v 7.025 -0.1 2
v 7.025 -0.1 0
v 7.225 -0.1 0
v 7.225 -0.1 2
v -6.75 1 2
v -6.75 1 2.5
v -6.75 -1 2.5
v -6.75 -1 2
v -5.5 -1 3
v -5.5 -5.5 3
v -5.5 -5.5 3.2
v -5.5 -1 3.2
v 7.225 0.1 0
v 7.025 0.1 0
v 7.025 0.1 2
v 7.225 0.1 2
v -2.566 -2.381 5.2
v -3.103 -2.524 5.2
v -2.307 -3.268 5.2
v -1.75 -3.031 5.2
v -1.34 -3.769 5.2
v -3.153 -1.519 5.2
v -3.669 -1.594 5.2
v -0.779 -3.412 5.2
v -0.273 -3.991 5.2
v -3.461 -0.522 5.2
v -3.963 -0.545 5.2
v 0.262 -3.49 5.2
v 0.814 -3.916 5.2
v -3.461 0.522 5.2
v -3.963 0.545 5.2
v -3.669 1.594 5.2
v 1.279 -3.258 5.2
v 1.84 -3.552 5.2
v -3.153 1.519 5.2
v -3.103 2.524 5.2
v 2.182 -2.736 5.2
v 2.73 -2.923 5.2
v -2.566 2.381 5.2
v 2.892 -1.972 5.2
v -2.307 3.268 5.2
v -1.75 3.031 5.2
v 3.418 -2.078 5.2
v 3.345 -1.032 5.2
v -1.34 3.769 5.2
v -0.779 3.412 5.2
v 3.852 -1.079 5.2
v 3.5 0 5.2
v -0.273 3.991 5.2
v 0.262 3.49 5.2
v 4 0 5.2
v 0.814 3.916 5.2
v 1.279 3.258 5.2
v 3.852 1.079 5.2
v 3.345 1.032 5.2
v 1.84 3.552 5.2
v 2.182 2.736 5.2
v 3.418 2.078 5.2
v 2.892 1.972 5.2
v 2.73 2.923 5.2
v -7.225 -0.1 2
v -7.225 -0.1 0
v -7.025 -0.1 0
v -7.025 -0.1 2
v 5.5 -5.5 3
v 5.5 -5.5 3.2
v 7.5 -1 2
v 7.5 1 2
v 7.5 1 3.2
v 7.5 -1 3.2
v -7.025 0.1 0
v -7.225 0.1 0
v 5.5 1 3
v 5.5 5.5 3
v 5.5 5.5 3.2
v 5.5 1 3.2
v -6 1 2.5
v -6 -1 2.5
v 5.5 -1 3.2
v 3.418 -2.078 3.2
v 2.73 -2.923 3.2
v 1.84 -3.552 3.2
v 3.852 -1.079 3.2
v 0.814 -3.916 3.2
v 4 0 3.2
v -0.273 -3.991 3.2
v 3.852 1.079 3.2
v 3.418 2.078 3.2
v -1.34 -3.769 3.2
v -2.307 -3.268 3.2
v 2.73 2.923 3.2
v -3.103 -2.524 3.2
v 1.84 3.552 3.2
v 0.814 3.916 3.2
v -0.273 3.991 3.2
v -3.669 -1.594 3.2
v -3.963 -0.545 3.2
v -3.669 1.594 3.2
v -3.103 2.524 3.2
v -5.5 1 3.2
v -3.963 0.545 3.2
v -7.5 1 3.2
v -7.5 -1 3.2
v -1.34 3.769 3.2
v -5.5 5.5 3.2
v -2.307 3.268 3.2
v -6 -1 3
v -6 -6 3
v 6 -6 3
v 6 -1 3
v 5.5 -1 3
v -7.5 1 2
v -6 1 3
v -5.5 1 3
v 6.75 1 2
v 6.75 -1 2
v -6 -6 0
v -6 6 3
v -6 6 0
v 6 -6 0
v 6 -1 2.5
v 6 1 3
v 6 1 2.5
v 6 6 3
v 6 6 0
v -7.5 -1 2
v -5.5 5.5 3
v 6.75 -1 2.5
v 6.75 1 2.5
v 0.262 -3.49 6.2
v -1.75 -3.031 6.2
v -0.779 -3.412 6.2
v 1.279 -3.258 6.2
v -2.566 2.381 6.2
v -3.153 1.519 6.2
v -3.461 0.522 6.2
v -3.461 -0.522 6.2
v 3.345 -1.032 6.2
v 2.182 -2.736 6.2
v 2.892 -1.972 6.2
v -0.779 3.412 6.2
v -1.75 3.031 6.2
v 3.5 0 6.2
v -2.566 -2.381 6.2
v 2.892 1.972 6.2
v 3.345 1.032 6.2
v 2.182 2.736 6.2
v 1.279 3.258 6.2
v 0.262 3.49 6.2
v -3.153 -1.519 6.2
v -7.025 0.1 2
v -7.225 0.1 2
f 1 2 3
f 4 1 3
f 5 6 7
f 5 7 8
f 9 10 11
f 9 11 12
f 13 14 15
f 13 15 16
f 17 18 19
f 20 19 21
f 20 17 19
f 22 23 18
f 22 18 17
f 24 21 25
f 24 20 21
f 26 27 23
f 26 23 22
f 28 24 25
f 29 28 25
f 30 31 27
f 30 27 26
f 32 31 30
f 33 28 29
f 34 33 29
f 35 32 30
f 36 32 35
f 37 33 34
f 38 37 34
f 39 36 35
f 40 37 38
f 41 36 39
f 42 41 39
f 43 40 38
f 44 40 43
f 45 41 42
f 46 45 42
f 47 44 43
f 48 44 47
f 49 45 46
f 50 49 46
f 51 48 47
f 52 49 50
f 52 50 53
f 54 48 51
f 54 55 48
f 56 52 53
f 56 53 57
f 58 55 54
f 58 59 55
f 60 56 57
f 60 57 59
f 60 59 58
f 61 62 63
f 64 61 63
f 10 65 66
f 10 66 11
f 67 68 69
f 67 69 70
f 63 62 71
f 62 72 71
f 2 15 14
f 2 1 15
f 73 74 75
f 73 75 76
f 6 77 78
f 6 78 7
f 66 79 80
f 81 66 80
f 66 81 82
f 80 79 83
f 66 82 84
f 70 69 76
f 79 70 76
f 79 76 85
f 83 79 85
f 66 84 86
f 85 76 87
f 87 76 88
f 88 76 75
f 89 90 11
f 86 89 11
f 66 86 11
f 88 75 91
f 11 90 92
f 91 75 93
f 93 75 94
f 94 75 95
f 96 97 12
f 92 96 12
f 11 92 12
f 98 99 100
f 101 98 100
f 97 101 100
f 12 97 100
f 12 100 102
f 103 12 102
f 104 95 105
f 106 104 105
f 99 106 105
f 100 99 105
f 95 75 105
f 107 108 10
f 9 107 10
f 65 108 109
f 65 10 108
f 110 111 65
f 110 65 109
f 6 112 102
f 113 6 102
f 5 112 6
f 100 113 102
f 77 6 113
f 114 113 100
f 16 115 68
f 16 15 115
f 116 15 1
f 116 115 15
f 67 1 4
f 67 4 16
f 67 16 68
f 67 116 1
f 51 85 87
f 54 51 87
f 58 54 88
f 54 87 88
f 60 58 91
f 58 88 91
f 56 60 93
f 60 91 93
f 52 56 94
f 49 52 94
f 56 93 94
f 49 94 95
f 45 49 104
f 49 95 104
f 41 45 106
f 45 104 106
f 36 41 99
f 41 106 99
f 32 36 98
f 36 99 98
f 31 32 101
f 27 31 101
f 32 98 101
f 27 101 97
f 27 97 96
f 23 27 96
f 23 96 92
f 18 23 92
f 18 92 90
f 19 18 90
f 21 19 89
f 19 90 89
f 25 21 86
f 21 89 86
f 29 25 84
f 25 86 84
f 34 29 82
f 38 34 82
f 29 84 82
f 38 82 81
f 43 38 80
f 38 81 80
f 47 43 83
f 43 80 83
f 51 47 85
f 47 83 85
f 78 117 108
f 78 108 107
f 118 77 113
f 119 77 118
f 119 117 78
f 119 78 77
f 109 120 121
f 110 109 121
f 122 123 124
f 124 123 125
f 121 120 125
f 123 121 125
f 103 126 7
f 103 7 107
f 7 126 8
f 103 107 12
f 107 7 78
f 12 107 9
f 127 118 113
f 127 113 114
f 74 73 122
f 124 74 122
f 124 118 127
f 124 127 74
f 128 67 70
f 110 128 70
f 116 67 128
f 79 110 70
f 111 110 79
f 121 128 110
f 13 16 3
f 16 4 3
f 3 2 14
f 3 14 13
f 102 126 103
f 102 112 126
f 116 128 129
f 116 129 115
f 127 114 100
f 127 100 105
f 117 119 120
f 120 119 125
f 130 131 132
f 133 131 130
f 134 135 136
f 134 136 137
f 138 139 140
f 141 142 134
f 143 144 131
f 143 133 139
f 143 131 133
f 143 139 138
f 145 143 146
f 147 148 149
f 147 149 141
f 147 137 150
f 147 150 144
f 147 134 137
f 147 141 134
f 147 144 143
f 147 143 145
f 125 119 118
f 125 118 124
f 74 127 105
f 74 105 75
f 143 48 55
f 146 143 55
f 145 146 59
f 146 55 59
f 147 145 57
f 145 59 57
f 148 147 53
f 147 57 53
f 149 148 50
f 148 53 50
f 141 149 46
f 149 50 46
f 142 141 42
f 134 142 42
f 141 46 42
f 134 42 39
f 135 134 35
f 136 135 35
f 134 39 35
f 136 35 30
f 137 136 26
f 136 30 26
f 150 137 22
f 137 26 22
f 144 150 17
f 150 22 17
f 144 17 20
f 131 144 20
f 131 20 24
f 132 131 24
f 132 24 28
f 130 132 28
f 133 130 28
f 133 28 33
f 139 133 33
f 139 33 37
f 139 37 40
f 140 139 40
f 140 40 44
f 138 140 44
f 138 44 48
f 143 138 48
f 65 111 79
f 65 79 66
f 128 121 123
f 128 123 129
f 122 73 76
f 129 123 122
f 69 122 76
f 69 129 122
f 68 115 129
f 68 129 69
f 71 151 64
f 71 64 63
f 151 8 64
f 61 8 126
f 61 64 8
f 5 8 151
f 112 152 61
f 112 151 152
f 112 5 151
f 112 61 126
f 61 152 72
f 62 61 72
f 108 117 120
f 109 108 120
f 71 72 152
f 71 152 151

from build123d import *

# Parameters (mm, degrees)
ESQUISSE1_W             = 12
ESQUISSE1_H             = 12
BOSS_EXTRU_1_DEPTH      = 3
BOSS_EXTRU_2_DEPTH      = 0.2
BOSS_EXTRU_3_DEPTH      = 1
ESQUISSE4_W             = 0.2
ESQUISSE4_H             = 2
BOSS_EXTRU_4_DEPTH      = 0.1
ESQUISSE5_R             = 4
BOSS_EXTRU_5_DEPTH      = 2
ESQUISSE6_R             = 3.5
ENL_V_MAT_EXTRU_1_DEPTH = 2
ESQUISSE7_R             = 3.5
BOSS_EXTRU_6_DEPTH      = 3


with BuildPart() as part:
    # Esquisse1 → Boss.-Extru.1 (new body)
    with BuildSketch(Plane.XY):
        Rectangle(ESQUISSE1_W, ESQUISSE1_H)
    extrude(amount=BOSS_EXTRU_1_DEPTH)

    # Esquisse2 → Boss.-Extru.2 (add)
    with BuildSketch(Plane.XY.offset(3)):
        Polygon((-5.5, 1), (-5.5, 5.5), (5.5, 5.5), (5.5, 1), (7.5, 1), (7.5, -1), (5.5, -1), (5.5, -5.5), (-5.5, -5.5), (-5.5, -1), (-7.5, -1), (-7.5, 1), align=None)
    extrude(amount=BOSS_EXTRU_2_DEPTH)

    # Esquisse3 → Boss.-Extru.3 (add, symmetric)
    with BuildSketch(Plane(origin=(0, 0, 0), x_dir=(1, 0, 0), z_dir=(0, 1, 0))):
        Polygon((6, -3), (6, -2.5), (6.75, -2.5), (6.75, -2), (7.5, -2), (7.5, -3), align=None)
        Polygon((-7.5, -3), (-6, -3), (-6, -2.5), (-6.75, -2.5), (-6.75, -2), (-7.5, -2), align=None)
    extrude(amount=BOSS_EXTRU_3_DEPTH, both=True)

    # Esquisse4 → Boss.-Extru.4 (add, symmetric)
    with BuildSketch(Plane(origin=(0, 0, 0), x_dir=(1, 0, 0), z_dir=(0, 1, 0))):
        with Locations((7.125, -1)):
            Rectangle(ESQUISSE4_W, ESQUISSE4_H)
        with Locations((-7.125, -1)):
            Rectangle(ESQUISSE4_W, ESQUISSE4_H)
    extrude(amount=BOSS_EXTRU_4_DEPTH, both=True)

    # Esquisse5 → Boss.-Extru.5 (add)
    with BuildSketch(Plane.XY.offset(3.2)):
        Circle(ESQUISSE5_R)
    extrude(amount=BOSS_EXTRU_5_DEPTH)

    # Esquisse6 → Enlèv. mat.-Extru.1 (cut)
    with BuildSketch(Plane.XY.offset(5.2)):
        Circle(ESQUISSE6_R)
    extrude(amount=-ENL_V_MAT_EXTRU_1_DEPTH, mode=Mode.SUBTRACT)

    # Esquisse7 → Boss.-Extru.6 (add)
    with BuildSketch(Plane.XY.offset(3.2)):
        Circle(ESQUISSE7_R)
    extrude(amount=BOSS_EXTRU_6_DEPTH)


solid = part.part
